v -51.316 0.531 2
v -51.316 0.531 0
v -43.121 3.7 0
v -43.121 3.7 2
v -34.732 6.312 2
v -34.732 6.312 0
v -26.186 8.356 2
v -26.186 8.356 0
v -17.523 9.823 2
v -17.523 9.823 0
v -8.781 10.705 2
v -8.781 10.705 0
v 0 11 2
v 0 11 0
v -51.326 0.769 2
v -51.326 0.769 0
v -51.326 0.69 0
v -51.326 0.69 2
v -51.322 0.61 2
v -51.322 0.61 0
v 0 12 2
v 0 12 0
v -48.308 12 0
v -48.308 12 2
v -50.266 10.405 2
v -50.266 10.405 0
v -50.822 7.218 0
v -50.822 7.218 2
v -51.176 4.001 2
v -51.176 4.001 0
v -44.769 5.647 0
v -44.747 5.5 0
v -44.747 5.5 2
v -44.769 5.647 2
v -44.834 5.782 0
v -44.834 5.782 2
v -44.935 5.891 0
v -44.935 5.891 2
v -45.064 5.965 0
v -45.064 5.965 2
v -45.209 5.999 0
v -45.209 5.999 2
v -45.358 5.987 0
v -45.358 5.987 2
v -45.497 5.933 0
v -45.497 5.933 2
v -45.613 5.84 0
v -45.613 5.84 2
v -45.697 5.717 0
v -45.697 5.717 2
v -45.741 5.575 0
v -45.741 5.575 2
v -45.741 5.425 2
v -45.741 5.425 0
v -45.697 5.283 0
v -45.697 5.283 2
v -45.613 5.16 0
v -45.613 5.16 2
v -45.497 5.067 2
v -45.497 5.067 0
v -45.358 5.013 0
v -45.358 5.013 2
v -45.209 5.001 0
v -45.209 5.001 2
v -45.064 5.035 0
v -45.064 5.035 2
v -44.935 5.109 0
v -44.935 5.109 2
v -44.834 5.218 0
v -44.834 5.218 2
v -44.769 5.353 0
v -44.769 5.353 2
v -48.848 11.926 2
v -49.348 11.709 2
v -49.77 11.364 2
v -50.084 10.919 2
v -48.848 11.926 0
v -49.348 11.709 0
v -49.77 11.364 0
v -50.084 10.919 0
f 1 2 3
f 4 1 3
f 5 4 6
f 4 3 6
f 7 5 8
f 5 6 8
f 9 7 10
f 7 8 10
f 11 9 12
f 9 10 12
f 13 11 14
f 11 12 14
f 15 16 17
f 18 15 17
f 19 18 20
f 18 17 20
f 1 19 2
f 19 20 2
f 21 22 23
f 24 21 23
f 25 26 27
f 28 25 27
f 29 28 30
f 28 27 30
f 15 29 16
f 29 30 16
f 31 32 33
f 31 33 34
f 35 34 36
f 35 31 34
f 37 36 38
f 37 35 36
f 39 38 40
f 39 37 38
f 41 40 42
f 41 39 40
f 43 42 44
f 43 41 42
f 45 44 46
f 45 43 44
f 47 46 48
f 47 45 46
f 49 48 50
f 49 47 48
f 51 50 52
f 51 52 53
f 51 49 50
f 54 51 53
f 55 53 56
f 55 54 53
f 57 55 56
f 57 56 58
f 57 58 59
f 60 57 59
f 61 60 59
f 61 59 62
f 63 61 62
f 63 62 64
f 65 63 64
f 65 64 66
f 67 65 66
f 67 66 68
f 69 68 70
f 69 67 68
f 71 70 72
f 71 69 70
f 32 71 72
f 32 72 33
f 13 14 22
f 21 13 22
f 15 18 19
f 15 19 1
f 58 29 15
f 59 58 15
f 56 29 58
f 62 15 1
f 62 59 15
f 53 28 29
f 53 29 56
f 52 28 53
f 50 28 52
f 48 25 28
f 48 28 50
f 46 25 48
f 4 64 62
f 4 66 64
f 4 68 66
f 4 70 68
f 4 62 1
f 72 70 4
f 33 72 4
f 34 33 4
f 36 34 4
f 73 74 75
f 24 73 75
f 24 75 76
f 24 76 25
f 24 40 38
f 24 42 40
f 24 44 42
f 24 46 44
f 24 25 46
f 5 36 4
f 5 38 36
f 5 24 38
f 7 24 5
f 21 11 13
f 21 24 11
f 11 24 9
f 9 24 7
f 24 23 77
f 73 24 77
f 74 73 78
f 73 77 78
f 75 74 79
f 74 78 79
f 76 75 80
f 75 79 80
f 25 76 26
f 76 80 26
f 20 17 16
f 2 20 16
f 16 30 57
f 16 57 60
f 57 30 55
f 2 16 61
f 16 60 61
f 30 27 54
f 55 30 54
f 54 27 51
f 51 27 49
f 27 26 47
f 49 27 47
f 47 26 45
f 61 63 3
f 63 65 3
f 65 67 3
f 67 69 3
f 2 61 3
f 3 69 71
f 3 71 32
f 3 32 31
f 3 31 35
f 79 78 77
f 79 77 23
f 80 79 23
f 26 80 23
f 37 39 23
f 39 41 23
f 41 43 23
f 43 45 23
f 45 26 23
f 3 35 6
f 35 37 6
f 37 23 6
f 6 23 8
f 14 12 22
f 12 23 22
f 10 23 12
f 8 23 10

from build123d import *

# Parameters (mm, degrees)
SKICA1_R                = 0.5
P_IDAT_VYSUNUT_M1_DEPTH = 2


with BuildPart() as part:
    # Skica1 → Přidat vysunutím1 (new body)
    with BuildSketch(Plane.XY):
        with BuildLine():
            Line((0, 11), (0, 12))
            Line((0, 12), (-48.307823831, 12))
            ThreePointArc((-48.307823831, 12), (-49.570592062, 11.550940487), (-50.266302206, 10.405416394))
            ThreePointArc((-50.266302206, 10.405416394), (-51.024263074, 5.612344033), (-51.326233925, 0.769115673))
            ThreePointArc((-51.326233925, 0.769115673), (-51.324464931, 0.649874315), (-51.31559221, 0.530950366))
            ThreePointArc((-51.31559221, 0.530950366), (-26.186308465, 8.356056534), (0, 11))
        make_face()
        with Locations((-45.246630015, 5.5)):
            Circle(SKICA1_R, mode=Mode.SUBTRACT)
    extrude(amount=P_IDAT_VYSUNUT_M1_DEPTH)


solid = part.part
